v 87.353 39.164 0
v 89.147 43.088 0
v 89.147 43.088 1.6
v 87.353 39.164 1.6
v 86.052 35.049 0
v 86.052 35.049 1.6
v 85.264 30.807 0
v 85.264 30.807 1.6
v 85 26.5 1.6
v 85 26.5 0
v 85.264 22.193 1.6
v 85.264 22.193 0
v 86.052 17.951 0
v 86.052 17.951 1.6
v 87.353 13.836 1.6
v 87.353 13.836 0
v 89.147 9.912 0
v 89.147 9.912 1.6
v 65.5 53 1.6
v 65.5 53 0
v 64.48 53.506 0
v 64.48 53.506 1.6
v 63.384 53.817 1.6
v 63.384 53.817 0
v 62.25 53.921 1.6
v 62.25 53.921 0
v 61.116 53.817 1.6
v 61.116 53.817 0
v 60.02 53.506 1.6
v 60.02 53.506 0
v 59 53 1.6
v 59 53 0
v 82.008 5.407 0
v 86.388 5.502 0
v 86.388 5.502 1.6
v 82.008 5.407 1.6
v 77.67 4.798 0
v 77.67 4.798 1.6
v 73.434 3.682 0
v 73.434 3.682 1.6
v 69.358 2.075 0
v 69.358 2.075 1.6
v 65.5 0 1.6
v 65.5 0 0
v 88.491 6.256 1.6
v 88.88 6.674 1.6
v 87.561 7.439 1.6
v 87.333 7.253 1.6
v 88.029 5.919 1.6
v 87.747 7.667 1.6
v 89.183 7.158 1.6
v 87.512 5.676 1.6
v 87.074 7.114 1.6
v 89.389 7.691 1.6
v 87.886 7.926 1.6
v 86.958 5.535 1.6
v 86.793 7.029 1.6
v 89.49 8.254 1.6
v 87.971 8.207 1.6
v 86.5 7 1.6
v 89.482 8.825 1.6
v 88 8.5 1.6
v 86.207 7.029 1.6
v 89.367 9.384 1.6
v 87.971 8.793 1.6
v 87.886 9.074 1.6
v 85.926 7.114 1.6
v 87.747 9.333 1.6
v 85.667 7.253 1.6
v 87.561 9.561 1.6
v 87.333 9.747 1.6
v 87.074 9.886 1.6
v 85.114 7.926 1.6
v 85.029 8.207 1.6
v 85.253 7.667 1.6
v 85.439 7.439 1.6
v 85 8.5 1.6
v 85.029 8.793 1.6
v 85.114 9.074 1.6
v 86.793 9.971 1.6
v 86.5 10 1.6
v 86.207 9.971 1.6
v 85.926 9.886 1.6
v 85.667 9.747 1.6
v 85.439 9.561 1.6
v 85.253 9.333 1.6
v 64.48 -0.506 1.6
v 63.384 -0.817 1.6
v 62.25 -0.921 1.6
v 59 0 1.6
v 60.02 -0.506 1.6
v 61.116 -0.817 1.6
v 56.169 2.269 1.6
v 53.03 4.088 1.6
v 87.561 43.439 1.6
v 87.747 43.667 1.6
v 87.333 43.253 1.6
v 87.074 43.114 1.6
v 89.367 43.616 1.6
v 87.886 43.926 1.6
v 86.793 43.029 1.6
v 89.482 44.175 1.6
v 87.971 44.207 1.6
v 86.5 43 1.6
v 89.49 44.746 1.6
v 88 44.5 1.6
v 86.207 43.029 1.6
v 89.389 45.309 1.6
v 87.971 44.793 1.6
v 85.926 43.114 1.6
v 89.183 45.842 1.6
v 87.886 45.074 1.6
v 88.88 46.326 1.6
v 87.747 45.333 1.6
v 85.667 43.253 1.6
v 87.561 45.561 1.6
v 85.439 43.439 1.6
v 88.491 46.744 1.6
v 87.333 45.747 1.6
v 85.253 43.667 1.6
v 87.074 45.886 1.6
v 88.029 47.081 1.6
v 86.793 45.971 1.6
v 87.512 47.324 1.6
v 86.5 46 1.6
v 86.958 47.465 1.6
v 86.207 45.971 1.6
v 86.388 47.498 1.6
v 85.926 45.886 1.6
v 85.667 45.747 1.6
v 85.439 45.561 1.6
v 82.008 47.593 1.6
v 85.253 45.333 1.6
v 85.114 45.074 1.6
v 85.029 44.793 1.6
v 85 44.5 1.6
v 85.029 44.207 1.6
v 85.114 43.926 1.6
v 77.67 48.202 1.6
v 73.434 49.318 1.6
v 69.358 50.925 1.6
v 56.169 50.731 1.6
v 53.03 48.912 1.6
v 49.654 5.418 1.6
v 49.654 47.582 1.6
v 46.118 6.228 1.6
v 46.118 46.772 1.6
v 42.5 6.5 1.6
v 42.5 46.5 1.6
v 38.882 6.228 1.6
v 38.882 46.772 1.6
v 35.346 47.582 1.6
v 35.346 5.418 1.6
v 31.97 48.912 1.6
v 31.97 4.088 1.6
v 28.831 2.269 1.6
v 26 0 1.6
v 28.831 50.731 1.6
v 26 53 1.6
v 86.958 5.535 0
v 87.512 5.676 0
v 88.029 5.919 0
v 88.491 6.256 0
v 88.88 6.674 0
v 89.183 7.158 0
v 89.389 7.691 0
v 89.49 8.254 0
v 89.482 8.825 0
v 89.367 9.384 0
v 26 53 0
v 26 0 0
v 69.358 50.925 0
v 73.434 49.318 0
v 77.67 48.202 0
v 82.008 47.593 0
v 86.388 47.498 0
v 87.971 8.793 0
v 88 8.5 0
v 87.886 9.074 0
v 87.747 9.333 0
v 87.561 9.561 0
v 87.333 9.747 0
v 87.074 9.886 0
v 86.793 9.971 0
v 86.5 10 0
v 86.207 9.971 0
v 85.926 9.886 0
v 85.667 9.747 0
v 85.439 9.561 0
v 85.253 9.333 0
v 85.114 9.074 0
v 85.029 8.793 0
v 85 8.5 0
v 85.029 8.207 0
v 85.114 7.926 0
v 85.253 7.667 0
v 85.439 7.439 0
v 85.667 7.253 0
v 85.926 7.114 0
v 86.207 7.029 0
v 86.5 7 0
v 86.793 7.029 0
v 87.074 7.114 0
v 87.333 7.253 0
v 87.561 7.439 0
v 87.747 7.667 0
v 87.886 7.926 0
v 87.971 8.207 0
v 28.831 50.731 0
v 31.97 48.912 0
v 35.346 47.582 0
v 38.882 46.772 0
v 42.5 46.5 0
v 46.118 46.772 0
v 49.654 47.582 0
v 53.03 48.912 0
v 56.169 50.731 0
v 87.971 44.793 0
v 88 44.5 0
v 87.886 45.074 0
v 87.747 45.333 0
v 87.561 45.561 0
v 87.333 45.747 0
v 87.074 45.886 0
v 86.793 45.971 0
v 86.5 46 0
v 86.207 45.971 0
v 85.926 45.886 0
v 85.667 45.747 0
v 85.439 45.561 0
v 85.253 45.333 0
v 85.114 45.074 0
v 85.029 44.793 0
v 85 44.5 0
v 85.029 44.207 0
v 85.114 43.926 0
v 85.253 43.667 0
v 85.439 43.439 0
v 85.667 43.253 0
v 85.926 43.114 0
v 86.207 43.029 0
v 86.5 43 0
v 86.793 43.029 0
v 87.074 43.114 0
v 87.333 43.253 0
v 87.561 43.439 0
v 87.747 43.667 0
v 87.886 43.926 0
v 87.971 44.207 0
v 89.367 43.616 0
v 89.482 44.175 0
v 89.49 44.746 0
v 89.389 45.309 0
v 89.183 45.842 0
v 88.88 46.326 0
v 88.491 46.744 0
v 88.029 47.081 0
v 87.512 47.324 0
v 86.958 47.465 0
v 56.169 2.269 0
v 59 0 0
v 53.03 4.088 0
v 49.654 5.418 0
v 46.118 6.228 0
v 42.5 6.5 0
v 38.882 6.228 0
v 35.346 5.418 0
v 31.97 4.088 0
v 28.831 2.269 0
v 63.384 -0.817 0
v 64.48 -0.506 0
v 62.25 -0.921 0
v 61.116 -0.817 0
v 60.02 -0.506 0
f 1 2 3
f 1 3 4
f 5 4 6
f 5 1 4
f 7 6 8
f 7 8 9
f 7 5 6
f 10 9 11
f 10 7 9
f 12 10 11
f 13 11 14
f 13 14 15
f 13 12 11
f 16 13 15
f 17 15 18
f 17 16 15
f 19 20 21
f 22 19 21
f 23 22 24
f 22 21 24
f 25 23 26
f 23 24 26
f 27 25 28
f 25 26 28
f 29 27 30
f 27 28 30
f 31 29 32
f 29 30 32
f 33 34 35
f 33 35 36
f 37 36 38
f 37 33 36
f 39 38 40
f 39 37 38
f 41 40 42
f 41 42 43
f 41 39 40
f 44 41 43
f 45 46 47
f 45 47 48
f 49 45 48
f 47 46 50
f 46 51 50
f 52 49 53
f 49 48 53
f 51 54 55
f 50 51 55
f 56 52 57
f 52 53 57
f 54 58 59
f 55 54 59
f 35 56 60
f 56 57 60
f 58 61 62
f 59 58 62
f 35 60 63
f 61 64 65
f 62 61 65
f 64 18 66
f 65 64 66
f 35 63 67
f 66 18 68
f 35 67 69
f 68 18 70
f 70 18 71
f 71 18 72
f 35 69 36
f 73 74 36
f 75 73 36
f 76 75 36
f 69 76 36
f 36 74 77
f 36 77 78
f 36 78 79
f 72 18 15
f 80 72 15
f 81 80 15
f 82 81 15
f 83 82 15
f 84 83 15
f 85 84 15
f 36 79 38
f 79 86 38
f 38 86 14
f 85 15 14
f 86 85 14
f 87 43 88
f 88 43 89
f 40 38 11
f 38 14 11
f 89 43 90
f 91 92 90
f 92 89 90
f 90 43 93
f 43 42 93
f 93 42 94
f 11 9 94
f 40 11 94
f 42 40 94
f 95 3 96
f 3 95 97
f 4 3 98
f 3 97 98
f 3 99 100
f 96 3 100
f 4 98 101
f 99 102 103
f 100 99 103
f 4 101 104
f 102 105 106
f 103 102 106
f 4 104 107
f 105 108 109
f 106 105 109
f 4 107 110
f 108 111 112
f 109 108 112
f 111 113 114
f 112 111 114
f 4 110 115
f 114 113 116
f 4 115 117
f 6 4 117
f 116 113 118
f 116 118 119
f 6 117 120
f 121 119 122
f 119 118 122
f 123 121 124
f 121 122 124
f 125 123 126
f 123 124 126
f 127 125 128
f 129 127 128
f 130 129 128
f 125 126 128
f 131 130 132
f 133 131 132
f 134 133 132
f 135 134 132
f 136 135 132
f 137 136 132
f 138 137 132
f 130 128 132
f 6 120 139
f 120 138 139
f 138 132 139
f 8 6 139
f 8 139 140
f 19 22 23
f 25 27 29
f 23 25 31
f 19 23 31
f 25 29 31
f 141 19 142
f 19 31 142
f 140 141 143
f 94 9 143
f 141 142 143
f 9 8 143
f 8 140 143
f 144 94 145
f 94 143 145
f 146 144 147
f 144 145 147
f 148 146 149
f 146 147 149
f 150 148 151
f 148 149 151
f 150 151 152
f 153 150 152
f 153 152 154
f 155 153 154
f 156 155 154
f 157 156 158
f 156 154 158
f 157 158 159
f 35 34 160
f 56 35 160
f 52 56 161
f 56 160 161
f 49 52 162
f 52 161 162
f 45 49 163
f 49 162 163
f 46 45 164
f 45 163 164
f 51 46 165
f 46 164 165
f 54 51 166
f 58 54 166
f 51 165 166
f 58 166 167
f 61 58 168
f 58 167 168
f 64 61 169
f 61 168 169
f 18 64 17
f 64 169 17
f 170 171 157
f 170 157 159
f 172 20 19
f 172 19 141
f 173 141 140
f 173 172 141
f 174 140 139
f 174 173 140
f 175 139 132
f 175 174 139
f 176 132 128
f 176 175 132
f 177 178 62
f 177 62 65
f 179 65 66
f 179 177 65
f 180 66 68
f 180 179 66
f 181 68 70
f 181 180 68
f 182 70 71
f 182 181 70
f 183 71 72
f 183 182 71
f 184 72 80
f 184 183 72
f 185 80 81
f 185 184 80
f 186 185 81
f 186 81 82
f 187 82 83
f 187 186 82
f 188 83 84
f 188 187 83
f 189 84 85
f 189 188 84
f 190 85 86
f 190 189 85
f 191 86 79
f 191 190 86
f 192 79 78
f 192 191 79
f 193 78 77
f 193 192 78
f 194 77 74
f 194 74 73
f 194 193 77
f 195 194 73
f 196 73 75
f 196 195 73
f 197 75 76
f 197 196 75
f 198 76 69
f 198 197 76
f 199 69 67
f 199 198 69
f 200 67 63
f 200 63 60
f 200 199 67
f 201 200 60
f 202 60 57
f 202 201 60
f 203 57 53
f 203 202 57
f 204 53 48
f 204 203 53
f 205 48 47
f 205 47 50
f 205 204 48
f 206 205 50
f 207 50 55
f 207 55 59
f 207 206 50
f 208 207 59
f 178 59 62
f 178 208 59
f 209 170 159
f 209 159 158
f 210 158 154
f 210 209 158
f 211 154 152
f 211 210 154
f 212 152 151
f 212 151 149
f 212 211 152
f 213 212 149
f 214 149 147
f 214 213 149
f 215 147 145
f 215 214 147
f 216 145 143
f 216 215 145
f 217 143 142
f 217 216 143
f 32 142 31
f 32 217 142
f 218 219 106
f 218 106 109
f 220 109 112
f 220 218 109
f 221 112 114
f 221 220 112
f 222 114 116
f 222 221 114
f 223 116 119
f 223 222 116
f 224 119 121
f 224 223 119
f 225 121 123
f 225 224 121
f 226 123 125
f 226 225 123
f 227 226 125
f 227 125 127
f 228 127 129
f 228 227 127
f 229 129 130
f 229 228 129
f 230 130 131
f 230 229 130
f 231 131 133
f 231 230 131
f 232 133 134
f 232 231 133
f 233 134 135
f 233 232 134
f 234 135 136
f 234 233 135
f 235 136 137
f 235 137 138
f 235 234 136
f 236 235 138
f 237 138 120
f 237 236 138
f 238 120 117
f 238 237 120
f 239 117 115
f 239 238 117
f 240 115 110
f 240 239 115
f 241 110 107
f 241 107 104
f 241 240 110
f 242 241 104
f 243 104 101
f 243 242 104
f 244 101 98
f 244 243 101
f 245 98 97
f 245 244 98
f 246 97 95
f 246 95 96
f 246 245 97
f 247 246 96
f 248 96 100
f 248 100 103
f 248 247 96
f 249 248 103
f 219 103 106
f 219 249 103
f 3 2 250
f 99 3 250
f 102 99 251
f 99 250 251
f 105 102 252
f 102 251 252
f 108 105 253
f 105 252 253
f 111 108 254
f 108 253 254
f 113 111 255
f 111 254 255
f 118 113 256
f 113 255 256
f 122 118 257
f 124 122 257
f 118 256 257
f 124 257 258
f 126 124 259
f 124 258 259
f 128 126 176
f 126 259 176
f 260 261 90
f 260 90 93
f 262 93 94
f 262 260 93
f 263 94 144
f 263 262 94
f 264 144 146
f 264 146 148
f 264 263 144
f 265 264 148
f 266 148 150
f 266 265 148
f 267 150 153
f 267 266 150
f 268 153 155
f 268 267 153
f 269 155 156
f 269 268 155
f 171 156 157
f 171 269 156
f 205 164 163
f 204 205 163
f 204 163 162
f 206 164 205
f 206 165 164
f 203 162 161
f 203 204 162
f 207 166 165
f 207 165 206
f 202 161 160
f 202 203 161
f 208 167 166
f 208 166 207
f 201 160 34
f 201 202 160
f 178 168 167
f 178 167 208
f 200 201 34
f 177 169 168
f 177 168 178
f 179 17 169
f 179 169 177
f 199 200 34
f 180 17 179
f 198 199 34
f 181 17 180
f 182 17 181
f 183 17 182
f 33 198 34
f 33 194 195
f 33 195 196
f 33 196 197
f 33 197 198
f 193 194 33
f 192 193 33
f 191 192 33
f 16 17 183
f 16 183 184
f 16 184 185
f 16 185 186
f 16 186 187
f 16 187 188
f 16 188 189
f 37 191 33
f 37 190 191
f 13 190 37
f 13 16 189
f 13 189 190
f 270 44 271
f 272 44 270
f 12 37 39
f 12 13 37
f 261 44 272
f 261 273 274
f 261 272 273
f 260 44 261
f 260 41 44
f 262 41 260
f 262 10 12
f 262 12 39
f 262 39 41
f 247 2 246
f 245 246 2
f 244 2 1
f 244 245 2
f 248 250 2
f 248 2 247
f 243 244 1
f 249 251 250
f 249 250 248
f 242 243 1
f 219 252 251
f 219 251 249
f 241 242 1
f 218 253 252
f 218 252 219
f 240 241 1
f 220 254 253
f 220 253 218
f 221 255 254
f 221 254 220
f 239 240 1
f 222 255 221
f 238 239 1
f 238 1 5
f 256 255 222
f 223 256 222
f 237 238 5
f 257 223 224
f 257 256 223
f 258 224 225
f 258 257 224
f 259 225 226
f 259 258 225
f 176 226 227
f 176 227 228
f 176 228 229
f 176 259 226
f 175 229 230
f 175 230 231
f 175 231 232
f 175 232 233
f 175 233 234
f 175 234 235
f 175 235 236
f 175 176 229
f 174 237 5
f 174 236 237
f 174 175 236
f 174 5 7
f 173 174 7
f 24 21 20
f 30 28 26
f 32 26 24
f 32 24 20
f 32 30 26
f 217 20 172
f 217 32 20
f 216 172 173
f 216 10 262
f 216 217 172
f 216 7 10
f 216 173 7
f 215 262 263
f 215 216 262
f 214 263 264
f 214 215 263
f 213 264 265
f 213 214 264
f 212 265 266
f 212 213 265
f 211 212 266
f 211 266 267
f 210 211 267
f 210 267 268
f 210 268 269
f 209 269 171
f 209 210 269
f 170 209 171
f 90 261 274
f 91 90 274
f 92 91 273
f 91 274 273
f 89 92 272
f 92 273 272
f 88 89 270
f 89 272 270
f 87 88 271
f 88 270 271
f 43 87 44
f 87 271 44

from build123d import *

# Parameters (mm, degrees)
SKETCH_R  = 1.5
PAD_DEPTH = 1.6


with BuildPart() as part:
    # Sketch → Pad (new body)
    with BuildSketch(Plane.XY):
        with BuildLine():
            ThreePointArc((59, 0), (42.5, 6.5), (26, 0))
            Line((26, 0), (26, 53))
            ThreePointArc((26, 53), (42.5, 46.5), (59, 53))
            ThreePointArc((65.5, 53), (62.25, 53.921337), (59, 53))
            ThreePointArc((65.5, 53), (75.535332, 48.697616), (86.38794, 47.497906))
            ThreePointArc((89.147059, 43.088235), (89.043198, 46.091272), (86.38794, 47.497906))
            ThreePointArc((89.147059, 43.088235), (85, 26.5), (89.147059, 9.911765))
            ThreePointArc((86.38794, 5.502094), (89.043198, 6.908728), (89.147059, 9.911765))
            ThreePointArc((86.38794, 5.502094), (75.535332, 4.302384), (65.5, 0))
            ThreePointArc((59, 0), (62.25, -0.921337), (65.5, 0))
        make_face()
        with Locations((86.5, 44.5)):
            Circle(SKETCH_R, mode=Mode.SUBTRACT)
        with Locations((86.5, 8.5)):
            Circle(SKETCH_R, mode=Mode.SUBTRACT)
    extrude(amount=PAD_DEPTH)


solid = part.part
